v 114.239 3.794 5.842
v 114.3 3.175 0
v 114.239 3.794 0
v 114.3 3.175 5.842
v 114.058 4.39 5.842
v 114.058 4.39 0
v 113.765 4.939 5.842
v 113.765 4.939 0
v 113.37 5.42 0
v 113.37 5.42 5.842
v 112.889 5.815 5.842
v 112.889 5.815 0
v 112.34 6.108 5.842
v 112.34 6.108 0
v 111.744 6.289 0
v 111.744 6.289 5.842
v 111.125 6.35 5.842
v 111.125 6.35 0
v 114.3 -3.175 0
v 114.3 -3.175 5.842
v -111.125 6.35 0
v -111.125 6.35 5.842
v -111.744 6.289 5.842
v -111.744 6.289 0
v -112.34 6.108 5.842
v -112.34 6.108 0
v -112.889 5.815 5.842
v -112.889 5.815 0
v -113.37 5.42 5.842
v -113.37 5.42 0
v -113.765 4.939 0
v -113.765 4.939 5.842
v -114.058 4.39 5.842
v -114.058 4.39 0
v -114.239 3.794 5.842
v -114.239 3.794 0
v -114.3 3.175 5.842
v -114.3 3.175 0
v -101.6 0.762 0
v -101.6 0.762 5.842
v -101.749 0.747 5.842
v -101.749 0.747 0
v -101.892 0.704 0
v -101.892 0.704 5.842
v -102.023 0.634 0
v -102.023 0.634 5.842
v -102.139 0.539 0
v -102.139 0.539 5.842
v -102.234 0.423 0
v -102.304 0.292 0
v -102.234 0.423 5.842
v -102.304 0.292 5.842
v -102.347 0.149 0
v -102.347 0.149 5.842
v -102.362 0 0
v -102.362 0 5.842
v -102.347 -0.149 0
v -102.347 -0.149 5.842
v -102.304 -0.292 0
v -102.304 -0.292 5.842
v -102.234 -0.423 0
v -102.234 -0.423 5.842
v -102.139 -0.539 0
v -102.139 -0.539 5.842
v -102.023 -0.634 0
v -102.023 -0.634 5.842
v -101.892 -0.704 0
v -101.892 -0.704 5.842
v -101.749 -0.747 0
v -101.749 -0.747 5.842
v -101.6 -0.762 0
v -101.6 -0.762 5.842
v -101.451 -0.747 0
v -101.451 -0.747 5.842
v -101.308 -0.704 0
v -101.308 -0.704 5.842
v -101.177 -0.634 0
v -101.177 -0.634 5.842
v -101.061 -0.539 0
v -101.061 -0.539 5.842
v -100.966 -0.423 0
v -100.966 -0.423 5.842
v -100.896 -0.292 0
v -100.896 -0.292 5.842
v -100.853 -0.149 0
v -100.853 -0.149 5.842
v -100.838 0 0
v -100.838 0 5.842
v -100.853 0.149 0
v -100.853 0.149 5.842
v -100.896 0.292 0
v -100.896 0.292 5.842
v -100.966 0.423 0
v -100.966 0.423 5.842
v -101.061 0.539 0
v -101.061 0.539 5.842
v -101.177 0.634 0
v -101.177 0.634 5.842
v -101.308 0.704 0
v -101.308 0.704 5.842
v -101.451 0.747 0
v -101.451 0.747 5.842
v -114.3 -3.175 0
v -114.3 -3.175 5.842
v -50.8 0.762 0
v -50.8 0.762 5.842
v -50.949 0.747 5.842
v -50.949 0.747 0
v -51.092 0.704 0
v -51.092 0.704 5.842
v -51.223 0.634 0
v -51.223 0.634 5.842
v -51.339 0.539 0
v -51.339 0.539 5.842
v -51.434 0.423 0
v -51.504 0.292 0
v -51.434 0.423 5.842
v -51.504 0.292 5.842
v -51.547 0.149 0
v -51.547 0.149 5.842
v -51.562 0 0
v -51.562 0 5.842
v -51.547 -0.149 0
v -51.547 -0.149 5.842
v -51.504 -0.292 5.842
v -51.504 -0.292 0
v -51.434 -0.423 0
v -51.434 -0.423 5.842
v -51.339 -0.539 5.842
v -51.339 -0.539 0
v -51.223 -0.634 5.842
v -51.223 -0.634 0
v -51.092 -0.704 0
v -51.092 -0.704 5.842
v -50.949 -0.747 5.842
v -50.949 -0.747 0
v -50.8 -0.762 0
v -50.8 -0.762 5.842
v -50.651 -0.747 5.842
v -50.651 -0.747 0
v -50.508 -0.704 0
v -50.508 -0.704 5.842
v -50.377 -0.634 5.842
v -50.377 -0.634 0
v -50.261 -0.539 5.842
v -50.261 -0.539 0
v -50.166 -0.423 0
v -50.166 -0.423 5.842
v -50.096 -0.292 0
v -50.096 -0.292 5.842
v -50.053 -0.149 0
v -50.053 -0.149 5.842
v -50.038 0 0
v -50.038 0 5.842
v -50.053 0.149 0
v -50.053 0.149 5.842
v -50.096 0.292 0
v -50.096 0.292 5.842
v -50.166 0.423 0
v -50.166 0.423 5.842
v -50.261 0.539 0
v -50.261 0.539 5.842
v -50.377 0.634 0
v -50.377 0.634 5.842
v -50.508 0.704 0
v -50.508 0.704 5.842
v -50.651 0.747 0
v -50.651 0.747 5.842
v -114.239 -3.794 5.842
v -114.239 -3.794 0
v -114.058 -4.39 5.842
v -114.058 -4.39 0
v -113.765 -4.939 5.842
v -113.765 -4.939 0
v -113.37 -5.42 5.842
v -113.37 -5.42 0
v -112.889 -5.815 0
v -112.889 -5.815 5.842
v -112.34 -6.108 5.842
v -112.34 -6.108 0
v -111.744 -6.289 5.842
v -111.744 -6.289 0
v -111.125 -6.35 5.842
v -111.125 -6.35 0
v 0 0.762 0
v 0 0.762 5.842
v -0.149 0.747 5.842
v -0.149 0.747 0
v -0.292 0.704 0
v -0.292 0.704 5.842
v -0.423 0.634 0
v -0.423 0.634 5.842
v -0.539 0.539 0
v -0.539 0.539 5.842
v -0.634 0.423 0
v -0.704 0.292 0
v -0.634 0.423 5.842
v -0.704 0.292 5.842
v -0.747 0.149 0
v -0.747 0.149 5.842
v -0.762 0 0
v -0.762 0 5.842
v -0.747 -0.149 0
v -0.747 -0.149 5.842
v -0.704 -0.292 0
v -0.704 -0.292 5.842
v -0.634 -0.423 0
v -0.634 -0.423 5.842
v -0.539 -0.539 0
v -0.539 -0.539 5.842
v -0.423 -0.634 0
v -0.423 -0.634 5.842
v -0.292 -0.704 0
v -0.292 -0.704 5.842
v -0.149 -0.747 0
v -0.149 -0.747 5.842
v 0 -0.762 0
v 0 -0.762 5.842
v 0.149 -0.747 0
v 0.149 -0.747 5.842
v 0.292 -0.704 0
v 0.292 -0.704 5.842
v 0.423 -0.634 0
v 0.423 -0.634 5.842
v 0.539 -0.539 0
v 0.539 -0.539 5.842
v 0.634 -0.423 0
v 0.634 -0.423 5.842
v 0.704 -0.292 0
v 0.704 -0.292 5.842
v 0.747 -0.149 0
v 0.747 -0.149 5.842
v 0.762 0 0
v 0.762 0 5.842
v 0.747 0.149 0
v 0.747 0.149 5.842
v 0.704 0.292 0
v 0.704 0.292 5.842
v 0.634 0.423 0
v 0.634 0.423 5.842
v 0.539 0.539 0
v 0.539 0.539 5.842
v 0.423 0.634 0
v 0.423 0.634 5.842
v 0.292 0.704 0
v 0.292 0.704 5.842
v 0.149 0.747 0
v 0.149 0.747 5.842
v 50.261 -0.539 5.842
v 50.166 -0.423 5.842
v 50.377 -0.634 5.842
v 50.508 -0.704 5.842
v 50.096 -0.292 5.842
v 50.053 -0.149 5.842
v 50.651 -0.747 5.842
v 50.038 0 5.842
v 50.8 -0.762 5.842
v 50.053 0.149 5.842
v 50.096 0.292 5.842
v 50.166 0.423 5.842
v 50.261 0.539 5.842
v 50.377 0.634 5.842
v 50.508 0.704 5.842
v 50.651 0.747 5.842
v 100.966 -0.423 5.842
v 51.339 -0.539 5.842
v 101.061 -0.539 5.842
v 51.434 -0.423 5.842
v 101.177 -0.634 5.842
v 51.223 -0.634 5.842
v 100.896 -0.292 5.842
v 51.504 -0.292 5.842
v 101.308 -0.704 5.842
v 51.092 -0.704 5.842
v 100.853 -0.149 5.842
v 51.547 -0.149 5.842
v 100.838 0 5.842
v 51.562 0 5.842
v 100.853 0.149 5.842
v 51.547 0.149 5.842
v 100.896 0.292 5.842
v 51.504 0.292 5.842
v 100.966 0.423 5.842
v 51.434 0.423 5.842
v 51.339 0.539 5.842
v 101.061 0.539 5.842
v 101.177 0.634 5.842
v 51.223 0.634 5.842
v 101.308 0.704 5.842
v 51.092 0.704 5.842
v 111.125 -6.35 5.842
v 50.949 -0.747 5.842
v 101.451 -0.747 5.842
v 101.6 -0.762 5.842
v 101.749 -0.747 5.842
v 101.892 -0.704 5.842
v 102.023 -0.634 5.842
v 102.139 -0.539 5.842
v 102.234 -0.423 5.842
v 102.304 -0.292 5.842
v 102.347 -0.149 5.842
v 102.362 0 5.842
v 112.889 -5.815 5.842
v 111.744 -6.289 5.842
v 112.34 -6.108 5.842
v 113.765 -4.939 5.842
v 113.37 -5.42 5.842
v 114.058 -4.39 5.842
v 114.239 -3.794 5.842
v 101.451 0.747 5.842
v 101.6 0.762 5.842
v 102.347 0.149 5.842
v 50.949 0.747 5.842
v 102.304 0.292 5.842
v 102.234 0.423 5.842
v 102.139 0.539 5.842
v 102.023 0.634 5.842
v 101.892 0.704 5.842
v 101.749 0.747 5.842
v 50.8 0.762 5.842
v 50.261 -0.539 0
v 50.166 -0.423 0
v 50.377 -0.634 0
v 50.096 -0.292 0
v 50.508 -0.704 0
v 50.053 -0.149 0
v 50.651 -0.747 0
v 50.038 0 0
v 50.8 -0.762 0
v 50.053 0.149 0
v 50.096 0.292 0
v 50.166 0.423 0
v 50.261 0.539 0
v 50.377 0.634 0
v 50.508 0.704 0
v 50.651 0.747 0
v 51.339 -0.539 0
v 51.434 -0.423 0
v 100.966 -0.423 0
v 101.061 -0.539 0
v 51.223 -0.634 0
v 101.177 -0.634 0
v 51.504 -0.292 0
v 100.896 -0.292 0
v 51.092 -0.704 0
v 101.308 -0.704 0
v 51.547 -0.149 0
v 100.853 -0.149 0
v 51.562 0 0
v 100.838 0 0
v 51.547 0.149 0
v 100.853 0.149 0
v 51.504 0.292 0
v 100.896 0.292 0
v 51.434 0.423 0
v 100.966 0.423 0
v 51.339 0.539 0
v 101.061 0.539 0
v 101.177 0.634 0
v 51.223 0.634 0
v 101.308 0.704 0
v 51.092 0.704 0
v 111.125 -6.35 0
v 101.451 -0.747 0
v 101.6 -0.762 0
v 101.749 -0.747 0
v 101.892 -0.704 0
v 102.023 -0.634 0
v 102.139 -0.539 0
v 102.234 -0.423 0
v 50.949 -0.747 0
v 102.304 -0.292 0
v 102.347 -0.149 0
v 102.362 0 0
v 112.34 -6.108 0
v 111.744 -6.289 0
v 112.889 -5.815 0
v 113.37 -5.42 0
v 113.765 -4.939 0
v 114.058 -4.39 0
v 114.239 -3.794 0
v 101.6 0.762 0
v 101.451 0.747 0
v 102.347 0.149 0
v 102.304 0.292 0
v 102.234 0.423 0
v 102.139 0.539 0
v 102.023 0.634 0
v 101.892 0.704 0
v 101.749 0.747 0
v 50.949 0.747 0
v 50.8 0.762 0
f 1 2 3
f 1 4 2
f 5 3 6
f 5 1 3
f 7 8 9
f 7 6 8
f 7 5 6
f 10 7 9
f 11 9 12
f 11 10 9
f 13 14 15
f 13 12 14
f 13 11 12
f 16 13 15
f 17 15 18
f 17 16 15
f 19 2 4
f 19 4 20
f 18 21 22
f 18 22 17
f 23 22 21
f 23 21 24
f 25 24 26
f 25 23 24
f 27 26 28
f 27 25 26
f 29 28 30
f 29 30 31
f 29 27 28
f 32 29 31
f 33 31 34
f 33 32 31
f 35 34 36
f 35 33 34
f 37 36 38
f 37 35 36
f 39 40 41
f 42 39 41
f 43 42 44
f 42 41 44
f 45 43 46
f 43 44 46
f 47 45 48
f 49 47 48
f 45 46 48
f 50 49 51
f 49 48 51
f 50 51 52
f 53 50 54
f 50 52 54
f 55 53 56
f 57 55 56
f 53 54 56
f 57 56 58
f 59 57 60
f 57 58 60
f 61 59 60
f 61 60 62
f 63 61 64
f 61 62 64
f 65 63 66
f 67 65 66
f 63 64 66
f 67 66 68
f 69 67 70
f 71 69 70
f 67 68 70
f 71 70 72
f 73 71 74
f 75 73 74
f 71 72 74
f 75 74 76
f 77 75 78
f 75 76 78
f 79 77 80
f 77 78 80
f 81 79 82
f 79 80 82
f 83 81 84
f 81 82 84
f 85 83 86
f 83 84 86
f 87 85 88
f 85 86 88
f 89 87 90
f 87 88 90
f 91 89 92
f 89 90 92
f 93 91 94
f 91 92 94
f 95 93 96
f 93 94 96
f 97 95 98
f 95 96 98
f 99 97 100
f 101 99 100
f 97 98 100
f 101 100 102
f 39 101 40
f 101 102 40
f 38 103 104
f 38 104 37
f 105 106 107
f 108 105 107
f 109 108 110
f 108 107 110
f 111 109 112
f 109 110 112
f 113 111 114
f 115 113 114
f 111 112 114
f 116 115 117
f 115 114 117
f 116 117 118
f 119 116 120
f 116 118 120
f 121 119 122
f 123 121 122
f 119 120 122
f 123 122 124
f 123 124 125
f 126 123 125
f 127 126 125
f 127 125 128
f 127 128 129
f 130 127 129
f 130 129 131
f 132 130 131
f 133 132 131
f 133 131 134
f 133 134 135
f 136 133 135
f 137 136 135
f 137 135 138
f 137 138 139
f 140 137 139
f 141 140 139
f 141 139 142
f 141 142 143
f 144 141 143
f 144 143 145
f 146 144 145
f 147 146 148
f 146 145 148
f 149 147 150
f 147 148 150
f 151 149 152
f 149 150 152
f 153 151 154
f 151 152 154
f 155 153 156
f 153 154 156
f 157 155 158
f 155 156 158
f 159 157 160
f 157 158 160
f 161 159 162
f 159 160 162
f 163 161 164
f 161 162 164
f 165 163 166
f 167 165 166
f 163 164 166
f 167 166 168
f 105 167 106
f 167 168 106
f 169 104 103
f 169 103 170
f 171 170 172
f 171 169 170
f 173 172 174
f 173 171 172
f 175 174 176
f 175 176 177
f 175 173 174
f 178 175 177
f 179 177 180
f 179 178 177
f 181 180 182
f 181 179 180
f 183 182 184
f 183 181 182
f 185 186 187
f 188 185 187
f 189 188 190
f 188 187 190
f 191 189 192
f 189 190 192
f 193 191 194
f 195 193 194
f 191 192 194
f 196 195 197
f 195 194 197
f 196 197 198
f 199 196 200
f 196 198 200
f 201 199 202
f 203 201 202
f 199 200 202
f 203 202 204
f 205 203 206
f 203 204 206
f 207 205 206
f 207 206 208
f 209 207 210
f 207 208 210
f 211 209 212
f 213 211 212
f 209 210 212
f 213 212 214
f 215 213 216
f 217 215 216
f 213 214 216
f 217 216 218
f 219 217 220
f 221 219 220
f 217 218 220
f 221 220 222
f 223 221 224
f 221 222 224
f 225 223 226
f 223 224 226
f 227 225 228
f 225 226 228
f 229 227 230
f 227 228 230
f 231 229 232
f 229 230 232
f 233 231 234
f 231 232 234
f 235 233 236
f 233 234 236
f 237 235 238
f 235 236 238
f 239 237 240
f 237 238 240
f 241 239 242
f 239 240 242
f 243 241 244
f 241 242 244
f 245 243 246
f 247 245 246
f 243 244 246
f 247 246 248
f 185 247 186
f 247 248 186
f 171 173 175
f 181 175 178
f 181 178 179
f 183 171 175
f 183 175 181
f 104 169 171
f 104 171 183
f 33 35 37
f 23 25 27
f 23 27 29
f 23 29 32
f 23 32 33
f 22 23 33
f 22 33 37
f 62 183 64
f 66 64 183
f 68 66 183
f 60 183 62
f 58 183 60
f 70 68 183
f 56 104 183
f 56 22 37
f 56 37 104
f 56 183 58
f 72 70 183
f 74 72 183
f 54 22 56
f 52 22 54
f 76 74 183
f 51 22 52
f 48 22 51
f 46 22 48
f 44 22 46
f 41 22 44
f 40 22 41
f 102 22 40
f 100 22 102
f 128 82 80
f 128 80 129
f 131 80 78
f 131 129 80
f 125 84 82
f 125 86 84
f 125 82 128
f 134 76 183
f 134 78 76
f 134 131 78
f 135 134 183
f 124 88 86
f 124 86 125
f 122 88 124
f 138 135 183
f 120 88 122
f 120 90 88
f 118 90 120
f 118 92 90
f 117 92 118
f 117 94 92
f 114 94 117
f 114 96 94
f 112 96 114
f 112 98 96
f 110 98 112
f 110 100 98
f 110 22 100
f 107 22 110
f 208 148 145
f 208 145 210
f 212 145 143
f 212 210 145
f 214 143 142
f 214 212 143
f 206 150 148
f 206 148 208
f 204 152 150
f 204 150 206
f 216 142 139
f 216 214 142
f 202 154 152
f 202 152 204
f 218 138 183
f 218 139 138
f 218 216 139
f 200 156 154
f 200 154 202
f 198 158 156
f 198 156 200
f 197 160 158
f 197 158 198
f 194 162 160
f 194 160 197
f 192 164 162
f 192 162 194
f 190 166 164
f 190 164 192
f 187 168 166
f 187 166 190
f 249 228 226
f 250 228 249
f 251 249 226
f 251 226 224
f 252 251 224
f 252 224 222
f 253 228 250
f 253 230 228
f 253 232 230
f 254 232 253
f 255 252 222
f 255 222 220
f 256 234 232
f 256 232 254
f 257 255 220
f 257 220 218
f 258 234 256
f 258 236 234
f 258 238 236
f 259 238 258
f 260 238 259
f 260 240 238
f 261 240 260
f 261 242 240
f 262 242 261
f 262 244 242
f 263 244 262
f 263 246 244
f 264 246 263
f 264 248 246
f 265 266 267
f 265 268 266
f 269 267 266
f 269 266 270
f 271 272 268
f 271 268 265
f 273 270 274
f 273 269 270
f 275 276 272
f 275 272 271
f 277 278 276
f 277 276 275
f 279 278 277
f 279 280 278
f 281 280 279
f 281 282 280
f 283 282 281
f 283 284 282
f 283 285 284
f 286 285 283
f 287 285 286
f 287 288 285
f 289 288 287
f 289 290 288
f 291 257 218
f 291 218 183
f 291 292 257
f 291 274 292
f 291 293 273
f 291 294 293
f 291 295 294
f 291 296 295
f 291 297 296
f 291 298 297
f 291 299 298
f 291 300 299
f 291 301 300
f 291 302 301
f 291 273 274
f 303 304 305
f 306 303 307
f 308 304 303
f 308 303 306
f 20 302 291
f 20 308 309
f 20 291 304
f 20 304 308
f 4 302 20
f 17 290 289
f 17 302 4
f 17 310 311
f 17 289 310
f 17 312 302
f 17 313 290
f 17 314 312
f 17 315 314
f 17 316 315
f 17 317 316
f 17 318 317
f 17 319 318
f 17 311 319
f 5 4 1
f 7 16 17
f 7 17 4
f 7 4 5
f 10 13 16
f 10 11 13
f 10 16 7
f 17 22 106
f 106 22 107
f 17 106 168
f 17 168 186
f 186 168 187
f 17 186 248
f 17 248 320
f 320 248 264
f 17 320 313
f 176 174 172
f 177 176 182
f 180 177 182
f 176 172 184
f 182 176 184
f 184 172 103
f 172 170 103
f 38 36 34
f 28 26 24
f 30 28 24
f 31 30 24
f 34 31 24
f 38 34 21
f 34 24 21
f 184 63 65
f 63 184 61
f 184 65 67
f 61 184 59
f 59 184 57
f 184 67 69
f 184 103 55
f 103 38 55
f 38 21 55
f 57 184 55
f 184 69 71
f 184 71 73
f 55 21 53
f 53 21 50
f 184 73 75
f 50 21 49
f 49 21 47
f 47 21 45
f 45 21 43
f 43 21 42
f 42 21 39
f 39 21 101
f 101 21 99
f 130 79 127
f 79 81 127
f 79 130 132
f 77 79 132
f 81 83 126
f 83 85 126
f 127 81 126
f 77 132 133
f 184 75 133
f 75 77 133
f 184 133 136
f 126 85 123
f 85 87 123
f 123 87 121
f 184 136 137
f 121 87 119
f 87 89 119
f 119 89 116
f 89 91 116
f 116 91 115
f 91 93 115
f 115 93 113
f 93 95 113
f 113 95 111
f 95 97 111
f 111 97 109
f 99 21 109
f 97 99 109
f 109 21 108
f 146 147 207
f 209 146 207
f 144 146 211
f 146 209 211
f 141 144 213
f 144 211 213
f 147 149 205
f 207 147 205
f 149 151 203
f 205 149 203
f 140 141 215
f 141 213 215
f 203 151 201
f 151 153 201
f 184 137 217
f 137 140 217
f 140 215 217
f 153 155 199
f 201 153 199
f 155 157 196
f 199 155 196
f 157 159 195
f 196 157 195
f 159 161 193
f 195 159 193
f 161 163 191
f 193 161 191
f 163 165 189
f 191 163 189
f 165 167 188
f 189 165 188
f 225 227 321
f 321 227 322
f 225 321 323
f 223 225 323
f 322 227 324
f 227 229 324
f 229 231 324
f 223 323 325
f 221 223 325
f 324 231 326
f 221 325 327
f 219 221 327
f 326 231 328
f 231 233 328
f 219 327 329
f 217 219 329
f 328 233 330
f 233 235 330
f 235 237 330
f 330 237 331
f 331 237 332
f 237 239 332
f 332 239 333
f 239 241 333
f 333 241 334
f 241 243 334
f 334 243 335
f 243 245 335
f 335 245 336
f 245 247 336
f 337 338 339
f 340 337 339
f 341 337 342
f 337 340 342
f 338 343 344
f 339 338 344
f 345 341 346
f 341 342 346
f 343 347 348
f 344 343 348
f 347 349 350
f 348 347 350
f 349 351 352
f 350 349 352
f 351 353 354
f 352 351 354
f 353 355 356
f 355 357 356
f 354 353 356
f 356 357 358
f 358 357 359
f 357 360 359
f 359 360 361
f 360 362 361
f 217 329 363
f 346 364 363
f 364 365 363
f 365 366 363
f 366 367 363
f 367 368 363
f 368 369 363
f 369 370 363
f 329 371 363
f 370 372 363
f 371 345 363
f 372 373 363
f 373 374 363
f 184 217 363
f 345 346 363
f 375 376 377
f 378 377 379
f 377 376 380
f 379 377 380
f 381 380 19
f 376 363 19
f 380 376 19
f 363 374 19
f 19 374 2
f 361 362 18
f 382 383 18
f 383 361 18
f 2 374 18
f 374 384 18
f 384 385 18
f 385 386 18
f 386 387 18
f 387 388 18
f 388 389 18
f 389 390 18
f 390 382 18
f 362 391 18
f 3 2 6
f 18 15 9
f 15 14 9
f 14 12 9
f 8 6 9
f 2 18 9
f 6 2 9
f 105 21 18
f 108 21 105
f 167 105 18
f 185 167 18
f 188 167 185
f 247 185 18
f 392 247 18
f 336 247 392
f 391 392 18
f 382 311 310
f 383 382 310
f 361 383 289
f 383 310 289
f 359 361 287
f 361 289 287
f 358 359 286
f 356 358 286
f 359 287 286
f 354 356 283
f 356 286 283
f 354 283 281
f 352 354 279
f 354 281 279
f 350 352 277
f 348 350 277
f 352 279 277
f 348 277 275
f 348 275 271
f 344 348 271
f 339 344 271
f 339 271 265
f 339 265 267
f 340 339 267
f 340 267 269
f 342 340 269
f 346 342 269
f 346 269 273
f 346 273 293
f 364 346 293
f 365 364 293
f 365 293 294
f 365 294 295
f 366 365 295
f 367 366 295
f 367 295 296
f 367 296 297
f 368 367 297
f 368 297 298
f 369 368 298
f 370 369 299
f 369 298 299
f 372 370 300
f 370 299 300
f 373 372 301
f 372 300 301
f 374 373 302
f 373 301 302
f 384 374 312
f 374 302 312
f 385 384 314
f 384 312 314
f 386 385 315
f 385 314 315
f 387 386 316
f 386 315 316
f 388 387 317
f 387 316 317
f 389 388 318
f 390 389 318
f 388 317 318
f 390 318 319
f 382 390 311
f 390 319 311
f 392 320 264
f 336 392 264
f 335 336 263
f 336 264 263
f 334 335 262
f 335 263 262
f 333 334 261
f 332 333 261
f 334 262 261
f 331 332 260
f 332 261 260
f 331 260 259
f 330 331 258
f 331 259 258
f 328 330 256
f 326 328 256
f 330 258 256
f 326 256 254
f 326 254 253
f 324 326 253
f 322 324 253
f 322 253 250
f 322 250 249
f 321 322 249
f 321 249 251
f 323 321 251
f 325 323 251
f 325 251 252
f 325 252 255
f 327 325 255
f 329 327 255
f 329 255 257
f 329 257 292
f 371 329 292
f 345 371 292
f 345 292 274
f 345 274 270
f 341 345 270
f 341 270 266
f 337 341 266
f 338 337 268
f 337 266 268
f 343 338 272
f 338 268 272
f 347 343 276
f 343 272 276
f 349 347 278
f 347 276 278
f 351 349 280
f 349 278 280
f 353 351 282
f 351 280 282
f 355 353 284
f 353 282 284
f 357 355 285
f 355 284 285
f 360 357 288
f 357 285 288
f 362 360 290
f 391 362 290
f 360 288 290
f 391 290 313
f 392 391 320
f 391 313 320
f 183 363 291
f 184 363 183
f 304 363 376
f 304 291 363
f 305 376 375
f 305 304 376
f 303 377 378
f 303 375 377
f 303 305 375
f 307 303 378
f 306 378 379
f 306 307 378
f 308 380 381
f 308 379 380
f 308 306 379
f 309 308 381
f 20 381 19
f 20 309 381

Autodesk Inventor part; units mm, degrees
ref_plane "YZ Plane" through (0, 0, 0) normal (1, 0, 0) x (0, 1, 0)
ref_plane "XZ Plane" through (0, 0, 0) normal (0, 1, 0) x (-1, 0, 0)
ref_plane "XY Plane" through (0, 0, 0) normal (0, 0, 1) x (1, 0, 0)
sketch "Sketch1" plane through (0, 0, 0) normal (0, 0, 1) x (1, 0, 0)
  line L0 (0, 8.89) -> (0, -8.89) projected
  line L1 (-160.02, 0) -> (160.02, 0) projected
  line L2 (114.3, -6.35) -> (-114.3, -6.35)
  line L3 (-114.3, -6.35) -> (-114.3, 6.35)
  line L4 (-114.3, 6.35) -> (114.3, 6.35)
  line L5 (114.3, 6.35) -> (114.3, -6.35)
  line L6 (114.3, -6.35) -> (-114.3, 6.35) construction
  line L7 (-114.3, -6.35) -> (114.3, 6.35) construction
  point P0 (0, 0)
  point P1 (-101.6, 0)
  point P2 (101.6, 0)
  point P3 (0, 0)
  point P4 (-50.8, 0)
  point P5 (50.8, 0)
  dimension "d0" = 228.6
  dimension "d1" = 12.7
  dimension "d2" = 101.6
  dimension "d3" = 101.6
  dimension "d14" = 50.8
  dimension "d15" = 50.8
extrude "Extrusion1" add sketch "Sketch1" along normal blind 5.842
hole "Hole1" at (-101.6, 0, 0) at (101.6, 0, 0) at (0, 0, 0) at (50.8, 0, 0) at (-50.8, 0, 0) direction (0, 0, 1) diameter 1.524 end through all
fillet "Fillet1" radius 3.175 4 edges at (114.3, -6.35, 2.921) (114.3, 6.35, 2.921) (-114.3, -6.35, 2.921) (-114.3, 6.35, 2.921)
